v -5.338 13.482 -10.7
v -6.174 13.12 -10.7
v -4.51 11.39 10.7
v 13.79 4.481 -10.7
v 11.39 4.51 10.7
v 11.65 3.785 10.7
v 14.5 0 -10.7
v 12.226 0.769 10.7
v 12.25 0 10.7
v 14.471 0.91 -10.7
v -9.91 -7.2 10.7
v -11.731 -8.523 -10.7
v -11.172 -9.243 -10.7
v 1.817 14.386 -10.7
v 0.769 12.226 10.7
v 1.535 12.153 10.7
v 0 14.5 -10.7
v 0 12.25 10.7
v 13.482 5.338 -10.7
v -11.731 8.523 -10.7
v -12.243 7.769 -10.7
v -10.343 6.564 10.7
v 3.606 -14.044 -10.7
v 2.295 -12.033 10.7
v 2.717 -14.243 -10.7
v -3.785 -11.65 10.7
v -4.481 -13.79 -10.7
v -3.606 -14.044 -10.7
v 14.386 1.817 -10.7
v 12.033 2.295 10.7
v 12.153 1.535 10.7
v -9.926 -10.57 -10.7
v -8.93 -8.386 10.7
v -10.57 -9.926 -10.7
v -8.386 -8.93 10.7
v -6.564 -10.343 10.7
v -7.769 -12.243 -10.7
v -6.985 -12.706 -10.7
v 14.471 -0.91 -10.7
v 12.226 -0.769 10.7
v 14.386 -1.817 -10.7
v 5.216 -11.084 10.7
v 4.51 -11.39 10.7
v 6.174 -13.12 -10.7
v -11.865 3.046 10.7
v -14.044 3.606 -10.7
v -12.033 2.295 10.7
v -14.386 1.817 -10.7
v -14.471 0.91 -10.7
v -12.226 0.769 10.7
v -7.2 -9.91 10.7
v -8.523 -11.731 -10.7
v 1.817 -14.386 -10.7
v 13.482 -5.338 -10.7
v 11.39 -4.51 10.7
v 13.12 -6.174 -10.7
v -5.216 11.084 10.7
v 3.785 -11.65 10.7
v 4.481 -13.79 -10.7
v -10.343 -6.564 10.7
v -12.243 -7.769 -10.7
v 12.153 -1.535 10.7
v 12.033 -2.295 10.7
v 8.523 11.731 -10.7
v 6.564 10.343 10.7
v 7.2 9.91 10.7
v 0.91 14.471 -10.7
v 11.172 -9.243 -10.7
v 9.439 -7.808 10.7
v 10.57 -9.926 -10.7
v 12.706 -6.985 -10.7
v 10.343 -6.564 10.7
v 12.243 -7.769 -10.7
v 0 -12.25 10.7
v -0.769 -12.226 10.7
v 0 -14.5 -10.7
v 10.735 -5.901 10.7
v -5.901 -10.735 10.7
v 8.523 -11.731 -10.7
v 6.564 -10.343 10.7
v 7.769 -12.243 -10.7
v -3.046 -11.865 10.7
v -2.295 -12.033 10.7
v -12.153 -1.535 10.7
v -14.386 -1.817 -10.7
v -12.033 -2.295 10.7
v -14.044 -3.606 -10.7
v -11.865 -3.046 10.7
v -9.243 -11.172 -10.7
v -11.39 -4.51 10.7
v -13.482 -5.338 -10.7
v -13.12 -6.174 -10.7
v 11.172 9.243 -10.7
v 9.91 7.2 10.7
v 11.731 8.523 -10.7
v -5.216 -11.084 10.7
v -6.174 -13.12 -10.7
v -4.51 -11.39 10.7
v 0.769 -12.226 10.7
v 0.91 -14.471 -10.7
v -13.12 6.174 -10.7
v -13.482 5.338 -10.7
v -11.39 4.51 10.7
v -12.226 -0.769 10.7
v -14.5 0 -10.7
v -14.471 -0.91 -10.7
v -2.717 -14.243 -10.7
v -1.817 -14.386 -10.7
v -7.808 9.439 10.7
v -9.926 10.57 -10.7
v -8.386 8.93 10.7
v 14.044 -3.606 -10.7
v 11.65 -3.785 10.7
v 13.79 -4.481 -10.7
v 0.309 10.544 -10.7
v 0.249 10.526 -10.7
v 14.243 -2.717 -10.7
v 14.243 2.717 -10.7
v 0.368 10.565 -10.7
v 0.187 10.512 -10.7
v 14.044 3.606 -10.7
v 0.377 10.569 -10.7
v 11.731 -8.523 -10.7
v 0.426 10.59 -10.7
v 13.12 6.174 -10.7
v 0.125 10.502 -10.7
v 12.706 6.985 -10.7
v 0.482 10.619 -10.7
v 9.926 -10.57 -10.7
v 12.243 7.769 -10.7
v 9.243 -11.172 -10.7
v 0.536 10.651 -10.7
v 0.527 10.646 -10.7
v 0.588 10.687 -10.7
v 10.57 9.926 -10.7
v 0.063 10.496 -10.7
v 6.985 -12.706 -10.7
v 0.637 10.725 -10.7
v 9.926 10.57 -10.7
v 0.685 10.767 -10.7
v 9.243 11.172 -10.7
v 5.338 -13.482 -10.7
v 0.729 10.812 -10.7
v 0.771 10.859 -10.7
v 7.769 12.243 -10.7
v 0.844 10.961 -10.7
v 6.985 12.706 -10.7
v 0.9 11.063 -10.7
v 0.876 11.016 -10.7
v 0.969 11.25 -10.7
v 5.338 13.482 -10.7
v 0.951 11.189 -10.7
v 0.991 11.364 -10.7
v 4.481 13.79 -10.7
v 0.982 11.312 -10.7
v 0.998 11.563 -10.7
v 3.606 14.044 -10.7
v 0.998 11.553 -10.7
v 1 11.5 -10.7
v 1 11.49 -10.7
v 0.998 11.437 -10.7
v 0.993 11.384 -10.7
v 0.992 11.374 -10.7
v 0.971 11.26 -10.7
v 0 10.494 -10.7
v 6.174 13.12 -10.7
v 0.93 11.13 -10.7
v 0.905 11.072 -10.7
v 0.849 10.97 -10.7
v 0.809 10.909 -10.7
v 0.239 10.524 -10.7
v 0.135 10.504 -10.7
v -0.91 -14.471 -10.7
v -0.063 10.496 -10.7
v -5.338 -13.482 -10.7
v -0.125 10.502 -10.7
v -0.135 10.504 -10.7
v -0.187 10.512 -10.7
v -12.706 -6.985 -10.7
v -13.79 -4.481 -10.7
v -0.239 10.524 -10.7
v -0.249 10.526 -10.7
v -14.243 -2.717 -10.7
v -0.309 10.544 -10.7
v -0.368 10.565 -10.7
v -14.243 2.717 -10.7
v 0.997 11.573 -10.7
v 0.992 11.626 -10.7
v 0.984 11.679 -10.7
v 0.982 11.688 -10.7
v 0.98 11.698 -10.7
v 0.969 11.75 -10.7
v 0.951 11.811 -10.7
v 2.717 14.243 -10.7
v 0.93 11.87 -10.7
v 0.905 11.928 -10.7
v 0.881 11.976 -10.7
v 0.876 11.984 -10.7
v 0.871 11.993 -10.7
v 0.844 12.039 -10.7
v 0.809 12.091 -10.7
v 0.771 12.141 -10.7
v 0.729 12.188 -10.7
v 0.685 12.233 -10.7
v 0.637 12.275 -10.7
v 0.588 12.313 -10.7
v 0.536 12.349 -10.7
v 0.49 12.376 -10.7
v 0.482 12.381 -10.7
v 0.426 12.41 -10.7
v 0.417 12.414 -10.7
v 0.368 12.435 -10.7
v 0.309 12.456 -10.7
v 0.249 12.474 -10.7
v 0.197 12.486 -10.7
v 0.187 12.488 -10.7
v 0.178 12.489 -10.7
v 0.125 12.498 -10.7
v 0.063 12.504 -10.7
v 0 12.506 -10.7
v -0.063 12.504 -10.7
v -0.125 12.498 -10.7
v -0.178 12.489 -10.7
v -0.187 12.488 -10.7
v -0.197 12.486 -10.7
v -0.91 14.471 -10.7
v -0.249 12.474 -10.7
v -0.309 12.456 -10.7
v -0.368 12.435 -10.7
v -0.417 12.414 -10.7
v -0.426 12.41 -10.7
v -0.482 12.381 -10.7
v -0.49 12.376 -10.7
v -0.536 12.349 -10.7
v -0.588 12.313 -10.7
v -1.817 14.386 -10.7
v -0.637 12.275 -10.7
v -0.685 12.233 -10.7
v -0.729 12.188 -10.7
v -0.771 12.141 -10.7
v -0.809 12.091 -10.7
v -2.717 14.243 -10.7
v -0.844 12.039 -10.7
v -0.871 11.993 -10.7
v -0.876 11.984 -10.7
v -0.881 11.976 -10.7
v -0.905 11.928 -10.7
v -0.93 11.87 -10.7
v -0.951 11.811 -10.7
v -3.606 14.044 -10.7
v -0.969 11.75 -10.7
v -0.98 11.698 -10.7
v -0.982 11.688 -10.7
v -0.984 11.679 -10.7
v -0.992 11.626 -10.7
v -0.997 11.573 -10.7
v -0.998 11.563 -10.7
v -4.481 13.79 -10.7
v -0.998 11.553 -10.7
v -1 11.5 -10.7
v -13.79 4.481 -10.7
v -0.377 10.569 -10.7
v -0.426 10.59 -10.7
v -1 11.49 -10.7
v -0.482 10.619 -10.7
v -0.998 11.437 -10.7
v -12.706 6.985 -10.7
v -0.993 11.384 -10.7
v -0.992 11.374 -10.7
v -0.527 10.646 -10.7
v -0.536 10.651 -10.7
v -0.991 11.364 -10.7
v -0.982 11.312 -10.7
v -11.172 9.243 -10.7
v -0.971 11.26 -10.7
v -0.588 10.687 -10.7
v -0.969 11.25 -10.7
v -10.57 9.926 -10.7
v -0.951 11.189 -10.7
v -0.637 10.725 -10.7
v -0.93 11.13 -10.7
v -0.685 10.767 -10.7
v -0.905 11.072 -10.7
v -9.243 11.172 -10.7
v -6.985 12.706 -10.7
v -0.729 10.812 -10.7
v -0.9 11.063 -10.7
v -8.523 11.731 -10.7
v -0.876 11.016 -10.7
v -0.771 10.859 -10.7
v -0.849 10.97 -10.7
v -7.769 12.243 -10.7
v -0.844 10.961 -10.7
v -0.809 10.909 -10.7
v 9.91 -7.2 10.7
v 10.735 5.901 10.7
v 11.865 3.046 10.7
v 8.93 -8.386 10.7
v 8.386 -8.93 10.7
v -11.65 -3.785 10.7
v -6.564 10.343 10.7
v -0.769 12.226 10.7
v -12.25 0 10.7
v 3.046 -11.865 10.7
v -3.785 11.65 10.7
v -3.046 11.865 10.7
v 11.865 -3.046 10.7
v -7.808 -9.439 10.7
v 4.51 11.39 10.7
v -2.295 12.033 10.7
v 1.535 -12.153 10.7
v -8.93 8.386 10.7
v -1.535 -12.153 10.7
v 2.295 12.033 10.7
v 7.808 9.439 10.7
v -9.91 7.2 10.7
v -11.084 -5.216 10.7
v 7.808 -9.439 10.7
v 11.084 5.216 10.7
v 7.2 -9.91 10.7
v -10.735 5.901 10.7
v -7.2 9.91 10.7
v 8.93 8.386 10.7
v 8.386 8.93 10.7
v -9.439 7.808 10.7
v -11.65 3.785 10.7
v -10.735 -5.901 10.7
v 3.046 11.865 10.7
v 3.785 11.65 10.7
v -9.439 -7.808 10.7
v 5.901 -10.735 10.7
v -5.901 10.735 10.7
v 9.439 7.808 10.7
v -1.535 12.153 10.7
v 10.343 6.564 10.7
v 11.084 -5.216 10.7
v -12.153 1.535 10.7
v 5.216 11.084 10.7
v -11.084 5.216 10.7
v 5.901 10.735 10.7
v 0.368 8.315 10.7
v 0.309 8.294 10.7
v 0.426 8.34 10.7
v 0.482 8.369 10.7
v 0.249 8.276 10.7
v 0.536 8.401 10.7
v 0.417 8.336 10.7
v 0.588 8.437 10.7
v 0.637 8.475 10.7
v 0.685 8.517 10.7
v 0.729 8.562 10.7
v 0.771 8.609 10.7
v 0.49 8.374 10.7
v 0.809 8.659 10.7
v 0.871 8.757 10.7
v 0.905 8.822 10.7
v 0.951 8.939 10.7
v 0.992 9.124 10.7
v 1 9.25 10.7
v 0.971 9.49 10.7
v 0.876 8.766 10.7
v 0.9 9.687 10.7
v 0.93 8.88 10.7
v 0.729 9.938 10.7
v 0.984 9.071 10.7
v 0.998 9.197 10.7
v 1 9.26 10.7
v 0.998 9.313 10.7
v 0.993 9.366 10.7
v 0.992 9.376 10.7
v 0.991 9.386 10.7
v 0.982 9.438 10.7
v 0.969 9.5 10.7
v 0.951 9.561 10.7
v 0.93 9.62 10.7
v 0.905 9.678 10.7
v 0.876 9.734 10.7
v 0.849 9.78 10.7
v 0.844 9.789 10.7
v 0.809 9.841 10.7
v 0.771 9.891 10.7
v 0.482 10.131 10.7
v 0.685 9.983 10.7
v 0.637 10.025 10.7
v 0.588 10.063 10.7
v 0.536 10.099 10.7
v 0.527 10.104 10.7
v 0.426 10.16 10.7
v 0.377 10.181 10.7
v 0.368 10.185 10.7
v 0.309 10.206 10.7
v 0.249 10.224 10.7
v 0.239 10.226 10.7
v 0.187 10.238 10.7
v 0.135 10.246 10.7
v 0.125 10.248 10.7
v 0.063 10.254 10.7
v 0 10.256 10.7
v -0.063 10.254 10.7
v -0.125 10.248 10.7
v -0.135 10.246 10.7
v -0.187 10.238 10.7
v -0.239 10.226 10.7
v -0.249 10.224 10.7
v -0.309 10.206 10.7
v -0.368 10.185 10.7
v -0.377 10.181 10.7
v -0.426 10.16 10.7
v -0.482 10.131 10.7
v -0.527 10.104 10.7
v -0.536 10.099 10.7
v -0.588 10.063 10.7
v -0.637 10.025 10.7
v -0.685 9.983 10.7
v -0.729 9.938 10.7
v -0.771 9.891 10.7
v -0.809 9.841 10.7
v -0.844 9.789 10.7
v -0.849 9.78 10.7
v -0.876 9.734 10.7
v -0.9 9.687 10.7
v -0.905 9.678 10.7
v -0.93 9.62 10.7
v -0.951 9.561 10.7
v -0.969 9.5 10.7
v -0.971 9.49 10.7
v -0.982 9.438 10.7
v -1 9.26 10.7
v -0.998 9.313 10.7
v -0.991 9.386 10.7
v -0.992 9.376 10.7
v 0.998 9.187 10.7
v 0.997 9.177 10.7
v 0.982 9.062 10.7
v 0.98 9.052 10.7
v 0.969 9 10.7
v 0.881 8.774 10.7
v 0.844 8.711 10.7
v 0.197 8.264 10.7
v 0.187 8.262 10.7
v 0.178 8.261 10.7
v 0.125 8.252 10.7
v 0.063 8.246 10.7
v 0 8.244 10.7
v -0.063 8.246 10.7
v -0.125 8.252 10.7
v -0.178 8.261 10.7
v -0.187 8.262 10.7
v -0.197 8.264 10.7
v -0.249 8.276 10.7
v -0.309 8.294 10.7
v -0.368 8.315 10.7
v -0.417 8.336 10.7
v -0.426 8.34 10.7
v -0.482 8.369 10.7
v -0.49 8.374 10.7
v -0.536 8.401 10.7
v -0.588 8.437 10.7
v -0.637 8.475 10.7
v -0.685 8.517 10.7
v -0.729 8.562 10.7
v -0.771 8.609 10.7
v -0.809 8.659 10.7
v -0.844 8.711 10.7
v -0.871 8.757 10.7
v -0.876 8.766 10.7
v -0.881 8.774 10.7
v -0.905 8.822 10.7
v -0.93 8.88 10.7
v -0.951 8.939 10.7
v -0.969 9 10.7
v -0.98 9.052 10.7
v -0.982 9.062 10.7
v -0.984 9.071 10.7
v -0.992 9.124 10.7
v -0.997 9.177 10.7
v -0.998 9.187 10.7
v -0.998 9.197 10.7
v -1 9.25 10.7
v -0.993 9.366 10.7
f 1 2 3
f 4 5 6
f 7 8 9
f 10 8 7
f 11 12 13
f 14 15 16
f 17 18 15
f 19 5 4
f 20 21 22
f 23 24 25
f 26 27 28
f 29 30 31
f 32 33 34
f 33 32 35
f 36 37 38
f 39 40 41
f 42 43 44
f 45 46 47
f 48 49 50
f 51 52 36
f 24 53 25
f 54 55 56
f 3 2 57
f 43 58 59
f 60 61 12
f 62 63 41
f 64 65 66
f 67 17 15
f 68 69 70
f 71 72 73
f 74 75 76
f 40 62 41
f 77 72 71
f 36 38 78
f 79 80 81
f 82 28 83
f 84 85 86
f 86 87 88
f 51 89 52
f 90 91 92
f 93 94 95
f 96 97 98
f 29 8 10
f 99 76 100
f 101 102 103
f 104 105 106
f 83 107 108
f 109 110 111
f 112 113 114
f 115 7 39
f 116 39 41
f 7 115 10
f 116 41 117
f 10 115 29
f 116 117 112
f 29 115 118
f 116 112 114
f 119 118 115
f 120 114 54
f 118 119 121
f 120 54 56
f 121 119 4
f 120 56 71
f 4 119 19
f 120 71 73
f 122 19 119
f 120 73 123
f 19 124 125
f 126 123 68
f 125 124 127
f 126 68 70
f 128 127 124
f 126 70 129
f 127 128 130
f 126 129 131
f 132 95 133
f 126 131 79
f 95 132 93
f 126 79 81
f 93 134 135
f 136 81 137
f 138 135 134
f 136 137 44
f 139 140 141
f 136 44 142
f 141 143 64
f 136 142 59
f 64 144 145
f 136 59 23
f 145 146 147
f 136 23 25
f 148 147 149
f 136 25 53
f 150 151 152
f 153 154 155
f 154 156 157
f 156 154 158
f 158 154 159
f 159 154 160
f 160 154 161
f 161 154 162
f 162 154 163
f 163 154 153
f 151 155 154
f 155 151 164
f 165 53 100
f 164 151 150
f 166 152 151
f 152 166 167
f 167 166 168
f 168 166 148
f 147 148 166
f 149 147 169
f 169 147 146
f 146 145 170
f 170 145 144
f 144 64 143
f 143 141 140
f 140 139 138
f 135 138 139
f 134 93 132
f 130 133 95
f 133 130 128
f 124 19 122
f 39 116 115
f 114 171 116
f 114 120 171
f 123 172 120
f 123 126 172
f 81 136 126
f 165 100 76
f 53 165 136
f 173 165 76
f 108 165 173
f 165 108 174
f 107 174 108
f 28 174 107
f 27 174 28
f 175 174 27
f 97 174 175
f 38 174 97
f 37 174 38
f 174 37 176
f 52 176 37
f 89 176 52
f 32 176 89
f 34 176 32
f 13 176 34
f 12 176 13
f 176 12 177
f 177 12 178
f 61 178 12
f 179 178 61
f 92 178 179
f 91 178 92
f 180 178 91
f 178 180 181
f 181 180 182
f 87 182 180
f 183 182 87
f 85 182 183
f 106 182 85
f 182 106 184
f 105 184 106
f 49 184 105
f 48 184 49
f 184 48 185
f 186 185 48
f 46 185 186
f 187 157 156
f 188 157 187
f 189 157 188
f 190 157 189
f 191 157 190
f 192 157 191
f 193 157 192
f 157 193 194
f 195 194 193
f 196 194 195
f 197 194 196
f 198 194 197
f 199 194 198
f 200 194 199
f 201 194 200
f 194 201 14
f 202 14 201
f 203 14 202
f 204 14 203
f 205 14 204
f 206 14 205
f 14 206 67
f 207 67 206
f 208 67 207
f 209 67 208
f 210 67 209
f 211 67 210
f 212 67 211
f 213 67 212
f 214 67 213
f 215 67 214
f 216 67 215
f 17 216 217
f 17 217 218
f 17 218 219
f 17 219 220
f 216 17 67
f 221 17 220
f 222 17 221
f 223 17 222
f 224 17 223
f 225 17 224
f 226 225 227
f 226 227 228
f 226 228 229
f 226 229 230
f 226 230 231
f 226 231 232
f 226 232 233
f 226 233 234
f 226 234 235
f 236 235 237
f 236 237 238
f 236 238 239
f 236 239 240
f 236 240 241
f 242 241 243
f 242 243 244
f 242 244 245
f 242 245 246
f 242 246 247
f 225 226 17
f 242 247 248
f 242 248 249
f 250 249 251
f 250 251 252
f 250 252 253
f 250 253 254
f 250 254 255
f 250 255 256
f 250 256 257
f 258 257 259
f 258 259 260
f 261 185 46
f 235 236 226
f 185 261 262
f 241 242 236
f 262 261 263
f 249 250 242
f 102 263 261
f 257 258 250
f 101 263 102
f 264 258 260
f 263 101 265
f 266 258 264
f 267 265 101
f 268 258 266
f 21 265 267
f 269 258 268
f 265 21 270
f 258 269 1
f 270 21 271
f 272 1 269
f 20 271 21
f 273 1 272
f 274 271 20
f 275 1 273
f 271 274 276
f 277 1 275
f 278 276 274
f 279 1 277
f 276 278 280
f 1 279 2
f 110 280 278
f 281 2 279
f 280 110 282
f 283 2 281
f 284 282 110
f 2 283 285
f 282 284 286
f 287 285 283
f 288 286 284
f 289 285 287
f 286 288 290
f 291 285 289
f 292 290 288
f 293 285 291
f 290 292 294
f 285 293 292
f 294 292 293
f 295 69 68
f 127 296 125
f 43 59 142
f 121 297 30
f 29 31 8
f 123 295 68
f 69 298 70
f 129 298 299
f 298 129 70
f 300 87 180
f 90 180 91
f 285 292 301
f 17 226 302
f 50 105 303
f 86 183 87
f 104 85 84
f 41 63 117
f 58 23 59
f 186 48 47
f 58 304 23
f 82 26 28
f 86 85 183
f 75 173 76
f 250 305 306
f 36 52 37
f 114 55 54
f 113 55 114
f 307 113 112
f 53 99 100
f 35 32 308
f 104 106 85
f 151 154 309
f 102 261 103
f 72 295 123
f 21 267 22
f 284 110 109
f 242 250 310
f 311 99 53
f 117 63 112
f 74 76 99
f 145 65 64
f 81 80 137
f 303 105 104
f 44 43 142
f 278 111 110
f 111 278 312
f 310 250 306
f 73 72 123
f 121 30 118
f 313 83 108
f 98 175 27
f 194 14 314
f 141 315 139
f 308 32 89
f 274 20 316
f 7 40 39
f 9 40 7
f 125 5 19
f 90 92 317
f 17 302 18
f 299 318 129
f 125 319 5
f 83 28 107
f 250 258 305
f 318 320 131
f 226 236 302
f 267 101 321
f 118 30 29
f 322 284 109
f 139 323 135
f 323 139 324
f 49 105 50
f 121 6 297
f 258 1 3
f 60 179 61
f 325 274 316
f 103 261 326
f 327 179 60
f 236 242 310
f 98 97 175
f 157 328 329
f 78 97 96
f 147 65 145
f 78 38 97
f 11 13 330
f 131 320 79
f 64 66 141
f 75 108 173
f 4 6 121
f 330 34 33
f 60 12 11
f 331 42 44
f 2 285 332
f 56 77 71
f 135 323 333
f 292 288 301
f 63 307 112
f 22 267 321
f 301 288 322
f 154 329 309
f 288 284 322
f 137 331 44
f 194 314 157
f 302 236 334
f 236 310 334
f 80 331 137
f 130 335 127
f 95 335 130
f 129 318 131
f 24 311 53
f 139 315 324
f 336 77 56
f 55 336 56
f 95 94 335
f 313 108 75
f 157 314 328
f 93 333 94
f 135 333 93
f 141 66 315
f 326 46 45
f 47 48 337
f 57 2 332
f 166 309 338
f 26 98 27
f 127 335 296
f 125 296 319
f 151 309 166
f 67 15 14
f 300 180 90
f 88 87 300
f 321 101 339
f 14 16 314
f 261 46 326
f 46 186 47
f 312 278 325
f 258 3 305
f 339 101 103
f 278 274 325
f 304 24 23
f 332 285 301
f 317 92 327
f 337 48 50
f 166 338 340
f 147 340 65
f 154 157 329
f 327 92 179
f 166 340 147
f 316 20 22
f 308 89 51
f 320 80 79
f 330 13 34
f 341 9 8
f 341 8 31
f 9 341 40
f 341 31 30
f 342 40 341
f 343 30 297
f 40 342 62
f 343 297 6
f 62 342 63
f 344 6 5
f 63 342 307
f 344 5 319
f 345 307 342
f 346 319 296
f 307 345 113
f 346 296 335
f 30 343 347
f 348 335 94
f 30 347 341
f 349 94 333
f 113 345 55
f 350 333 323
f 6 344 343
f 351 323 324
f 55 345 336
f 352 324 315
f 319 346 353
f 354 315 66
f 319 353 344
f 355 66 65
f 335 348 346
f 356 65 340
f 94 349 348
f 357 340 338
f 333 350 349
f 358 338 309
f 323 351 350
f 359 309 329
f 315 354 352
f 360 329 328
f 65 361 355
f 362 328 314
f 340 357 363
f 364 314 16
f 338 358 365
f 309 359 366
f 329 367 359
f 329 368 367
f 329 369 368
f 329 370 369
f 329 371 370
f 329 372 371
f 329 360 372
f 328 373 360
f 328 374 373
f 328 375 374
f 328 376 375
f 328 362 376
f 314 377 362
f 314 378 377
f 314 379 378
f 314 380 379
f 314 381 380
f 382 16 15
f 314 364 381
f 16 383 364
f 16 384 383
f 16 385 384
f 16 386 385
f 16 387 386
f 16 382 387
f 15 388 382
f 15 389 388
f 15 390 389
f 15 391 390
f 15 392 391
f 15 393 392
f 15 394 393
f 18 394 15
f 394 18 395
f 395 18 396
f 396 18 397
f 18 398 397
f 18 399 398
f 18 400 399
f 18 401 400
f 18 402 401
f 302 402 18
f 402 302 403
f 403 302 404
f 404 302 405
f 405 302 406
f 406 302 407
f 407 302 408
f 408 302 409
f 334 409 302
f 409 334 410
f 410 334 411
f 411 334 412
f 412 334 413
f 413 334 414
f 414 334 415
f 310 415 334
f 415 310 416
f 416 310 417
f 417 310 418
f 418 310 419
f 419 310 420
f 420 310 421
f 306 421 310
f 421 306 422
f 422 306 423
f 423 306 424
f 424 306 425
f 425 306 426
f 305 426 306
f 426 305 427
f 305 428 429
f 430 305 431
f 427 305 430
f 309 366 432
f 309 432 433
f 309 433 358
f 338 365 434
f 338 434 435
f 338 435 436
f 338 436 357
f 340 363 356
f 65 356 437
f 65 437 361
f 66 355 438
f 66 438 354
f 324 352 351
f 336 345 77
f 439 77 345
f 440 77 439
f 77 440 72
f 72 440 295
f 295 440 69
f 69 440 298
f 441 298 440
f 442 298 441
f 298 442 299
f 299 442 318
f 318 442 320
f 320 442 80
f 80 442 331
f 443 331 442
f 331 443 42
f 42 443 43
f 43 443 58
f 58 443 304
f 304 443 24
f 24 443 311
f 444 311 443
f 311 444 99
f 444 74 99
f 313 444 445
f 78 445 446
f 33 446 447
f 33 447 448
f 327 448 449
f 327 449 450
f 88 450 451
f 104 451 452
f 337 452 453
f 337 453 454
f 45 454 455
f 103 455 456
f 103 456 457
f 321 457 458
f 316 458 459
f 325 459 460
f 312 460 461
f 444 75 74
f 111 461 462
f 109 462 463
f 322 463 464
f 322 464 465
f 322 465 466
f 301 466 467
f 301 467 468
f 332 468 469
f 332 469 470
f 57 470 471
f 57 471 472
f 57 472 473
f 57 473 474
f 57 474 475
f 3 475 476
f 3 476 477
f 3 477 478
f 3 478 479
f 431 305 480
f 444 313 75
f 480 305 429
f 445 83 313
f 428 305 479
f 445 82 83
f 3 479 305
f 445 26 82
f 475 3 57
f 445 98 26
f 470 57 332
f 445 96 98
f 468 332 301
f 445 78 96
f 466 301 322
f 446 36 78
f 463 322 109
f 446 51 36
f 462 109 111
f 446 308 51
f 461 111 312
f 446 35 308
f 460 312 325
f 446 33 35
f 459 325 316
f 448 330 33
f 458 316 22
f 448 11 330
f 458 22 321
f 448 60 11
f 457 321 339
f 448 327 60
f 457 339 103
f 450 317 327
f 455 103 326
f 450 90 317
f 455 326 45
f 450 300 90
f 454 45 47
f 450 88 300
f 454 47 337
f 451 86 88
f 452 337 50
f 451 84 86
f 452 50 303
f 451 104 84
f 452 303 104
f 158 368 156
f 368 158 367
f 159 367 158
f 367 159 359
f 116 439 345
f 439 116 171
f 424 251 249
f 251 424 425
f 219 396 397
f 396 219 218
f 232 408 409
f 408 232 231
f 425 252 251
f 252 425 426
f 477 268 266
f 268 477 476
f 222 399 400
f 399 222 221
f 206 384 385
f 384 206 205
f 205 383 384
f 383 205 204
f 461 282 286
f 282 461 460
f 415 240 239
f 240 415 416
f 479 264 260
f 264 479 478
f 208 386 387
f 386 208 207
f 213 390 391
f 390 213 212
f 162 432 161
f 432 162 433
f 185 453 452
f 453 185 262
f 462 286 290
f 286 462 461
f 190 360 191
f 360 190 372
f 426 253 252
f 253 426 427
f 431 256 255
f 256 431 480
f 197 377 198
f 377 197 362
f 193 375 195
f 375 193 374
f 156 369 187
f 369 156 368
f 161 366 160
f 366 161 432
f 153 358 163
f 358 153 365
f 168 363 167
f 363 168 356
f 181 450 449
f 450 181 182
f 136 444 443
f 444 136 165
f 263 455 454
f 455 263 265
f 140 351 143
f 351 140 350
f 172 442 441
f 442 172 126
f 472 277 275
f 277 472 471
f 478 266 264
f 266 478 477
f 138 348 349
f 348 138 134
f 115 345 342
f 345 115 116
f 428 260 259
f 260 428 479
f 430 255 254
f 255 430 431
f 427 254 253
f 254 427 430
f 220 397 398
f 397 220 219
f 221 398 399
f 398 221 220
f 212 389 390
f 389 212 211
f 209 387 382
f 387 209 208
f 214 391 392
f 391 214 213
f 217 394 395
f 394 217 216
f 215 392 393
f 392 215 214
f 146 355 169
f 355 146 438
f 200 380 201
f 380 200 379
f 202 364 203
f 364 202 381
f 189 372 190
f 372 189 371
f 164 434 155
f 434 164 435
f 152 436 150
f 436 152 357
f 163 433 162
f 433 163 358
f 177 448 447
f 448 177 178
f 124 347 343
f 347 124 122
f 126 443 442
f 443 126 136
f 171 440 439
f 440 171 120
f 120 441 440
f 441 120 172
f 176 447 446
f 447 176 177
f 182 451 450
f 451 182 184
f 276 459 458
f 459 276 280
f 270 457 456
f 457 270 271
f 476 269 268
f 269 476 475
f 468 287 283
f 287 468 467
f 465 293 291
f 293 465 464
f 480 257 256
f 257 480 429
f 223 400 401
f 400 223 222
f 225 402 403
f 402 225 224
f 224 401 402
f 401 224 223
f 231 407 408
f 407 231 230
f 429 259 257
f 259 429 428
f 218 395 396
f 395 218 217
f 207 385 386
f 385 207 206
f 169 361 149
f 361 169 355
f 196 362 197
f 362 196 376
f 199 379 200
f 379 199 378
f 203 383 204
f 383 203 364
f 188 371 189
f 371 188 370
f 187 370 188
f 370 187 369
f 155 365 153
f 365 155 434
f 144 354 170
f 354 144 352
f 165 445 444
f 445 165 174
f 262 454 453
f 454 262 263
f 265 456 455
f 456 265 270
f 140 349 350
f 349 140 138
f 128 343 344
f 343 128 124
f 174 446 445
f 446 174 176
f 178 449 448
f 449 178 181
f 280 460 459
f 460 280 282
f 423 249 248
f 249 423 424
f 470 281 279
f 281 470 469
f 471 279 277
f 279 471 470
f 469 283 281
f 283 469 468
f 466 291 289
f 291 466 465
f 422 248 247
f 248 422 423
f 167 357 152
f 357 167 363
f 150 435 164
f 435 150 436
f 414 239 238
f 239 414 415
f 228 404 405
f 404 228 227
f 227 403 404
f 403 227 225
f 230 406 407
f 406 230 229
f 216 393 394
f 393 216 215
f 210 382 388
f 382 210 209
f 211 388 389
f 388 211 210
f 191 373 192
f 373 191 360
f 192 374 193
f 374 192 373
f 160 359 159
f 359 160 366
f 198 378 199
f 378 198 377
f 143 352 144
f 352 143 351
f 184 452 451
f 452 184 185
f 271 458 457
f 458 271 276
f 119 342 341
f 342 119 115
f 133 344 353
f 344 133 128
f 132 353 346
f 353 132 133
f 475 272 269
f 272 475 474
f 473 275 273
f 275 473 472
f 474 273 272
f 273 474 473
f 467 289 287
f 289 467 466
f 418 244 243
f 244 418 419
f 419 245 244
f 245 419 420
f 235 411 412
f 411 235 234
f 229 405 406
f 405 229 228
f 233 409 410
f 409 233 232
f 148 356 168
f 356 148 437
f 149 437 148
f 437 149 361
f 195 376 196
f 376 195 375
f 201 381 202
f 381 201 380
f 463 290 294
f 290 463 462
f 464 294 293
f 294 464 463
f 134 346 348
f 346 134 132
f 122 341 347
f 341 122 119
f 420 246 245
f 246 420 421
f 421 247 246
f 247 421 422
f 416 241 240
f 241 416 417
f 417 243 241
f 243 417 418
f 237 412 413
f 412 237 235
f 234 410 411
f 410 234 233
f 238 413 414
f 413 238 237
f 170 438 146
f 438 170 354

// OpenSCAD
// [FL_INDEX: keywords="openscad, 3d_parametric, Cork_for_oil_container_-_tapon_de_aceitera__customizer_version, csg_solid" | COT="Parametric OpenSCAD design from 3DCodeverse"]
// Title: Cork for oil container - tapon de aceitera (customizer version)

$fn=100*1;

//larger width radius (half the diameter)
radius1=14.5; 

//shorter width radius (half the diameter)
radius2=12.25; 

// height
height=21.4; 

//angle for the air hole
angle=atan((radius1-radius2)/height);

difference(){
	cylinder(h=height,r1=radius1, r2=radius2, center=true);
		translate([0,(radius1+radius2)/2-3,0])rotate([angle,0,0])cylinder(h=height+10,r=1, center=true);

}
